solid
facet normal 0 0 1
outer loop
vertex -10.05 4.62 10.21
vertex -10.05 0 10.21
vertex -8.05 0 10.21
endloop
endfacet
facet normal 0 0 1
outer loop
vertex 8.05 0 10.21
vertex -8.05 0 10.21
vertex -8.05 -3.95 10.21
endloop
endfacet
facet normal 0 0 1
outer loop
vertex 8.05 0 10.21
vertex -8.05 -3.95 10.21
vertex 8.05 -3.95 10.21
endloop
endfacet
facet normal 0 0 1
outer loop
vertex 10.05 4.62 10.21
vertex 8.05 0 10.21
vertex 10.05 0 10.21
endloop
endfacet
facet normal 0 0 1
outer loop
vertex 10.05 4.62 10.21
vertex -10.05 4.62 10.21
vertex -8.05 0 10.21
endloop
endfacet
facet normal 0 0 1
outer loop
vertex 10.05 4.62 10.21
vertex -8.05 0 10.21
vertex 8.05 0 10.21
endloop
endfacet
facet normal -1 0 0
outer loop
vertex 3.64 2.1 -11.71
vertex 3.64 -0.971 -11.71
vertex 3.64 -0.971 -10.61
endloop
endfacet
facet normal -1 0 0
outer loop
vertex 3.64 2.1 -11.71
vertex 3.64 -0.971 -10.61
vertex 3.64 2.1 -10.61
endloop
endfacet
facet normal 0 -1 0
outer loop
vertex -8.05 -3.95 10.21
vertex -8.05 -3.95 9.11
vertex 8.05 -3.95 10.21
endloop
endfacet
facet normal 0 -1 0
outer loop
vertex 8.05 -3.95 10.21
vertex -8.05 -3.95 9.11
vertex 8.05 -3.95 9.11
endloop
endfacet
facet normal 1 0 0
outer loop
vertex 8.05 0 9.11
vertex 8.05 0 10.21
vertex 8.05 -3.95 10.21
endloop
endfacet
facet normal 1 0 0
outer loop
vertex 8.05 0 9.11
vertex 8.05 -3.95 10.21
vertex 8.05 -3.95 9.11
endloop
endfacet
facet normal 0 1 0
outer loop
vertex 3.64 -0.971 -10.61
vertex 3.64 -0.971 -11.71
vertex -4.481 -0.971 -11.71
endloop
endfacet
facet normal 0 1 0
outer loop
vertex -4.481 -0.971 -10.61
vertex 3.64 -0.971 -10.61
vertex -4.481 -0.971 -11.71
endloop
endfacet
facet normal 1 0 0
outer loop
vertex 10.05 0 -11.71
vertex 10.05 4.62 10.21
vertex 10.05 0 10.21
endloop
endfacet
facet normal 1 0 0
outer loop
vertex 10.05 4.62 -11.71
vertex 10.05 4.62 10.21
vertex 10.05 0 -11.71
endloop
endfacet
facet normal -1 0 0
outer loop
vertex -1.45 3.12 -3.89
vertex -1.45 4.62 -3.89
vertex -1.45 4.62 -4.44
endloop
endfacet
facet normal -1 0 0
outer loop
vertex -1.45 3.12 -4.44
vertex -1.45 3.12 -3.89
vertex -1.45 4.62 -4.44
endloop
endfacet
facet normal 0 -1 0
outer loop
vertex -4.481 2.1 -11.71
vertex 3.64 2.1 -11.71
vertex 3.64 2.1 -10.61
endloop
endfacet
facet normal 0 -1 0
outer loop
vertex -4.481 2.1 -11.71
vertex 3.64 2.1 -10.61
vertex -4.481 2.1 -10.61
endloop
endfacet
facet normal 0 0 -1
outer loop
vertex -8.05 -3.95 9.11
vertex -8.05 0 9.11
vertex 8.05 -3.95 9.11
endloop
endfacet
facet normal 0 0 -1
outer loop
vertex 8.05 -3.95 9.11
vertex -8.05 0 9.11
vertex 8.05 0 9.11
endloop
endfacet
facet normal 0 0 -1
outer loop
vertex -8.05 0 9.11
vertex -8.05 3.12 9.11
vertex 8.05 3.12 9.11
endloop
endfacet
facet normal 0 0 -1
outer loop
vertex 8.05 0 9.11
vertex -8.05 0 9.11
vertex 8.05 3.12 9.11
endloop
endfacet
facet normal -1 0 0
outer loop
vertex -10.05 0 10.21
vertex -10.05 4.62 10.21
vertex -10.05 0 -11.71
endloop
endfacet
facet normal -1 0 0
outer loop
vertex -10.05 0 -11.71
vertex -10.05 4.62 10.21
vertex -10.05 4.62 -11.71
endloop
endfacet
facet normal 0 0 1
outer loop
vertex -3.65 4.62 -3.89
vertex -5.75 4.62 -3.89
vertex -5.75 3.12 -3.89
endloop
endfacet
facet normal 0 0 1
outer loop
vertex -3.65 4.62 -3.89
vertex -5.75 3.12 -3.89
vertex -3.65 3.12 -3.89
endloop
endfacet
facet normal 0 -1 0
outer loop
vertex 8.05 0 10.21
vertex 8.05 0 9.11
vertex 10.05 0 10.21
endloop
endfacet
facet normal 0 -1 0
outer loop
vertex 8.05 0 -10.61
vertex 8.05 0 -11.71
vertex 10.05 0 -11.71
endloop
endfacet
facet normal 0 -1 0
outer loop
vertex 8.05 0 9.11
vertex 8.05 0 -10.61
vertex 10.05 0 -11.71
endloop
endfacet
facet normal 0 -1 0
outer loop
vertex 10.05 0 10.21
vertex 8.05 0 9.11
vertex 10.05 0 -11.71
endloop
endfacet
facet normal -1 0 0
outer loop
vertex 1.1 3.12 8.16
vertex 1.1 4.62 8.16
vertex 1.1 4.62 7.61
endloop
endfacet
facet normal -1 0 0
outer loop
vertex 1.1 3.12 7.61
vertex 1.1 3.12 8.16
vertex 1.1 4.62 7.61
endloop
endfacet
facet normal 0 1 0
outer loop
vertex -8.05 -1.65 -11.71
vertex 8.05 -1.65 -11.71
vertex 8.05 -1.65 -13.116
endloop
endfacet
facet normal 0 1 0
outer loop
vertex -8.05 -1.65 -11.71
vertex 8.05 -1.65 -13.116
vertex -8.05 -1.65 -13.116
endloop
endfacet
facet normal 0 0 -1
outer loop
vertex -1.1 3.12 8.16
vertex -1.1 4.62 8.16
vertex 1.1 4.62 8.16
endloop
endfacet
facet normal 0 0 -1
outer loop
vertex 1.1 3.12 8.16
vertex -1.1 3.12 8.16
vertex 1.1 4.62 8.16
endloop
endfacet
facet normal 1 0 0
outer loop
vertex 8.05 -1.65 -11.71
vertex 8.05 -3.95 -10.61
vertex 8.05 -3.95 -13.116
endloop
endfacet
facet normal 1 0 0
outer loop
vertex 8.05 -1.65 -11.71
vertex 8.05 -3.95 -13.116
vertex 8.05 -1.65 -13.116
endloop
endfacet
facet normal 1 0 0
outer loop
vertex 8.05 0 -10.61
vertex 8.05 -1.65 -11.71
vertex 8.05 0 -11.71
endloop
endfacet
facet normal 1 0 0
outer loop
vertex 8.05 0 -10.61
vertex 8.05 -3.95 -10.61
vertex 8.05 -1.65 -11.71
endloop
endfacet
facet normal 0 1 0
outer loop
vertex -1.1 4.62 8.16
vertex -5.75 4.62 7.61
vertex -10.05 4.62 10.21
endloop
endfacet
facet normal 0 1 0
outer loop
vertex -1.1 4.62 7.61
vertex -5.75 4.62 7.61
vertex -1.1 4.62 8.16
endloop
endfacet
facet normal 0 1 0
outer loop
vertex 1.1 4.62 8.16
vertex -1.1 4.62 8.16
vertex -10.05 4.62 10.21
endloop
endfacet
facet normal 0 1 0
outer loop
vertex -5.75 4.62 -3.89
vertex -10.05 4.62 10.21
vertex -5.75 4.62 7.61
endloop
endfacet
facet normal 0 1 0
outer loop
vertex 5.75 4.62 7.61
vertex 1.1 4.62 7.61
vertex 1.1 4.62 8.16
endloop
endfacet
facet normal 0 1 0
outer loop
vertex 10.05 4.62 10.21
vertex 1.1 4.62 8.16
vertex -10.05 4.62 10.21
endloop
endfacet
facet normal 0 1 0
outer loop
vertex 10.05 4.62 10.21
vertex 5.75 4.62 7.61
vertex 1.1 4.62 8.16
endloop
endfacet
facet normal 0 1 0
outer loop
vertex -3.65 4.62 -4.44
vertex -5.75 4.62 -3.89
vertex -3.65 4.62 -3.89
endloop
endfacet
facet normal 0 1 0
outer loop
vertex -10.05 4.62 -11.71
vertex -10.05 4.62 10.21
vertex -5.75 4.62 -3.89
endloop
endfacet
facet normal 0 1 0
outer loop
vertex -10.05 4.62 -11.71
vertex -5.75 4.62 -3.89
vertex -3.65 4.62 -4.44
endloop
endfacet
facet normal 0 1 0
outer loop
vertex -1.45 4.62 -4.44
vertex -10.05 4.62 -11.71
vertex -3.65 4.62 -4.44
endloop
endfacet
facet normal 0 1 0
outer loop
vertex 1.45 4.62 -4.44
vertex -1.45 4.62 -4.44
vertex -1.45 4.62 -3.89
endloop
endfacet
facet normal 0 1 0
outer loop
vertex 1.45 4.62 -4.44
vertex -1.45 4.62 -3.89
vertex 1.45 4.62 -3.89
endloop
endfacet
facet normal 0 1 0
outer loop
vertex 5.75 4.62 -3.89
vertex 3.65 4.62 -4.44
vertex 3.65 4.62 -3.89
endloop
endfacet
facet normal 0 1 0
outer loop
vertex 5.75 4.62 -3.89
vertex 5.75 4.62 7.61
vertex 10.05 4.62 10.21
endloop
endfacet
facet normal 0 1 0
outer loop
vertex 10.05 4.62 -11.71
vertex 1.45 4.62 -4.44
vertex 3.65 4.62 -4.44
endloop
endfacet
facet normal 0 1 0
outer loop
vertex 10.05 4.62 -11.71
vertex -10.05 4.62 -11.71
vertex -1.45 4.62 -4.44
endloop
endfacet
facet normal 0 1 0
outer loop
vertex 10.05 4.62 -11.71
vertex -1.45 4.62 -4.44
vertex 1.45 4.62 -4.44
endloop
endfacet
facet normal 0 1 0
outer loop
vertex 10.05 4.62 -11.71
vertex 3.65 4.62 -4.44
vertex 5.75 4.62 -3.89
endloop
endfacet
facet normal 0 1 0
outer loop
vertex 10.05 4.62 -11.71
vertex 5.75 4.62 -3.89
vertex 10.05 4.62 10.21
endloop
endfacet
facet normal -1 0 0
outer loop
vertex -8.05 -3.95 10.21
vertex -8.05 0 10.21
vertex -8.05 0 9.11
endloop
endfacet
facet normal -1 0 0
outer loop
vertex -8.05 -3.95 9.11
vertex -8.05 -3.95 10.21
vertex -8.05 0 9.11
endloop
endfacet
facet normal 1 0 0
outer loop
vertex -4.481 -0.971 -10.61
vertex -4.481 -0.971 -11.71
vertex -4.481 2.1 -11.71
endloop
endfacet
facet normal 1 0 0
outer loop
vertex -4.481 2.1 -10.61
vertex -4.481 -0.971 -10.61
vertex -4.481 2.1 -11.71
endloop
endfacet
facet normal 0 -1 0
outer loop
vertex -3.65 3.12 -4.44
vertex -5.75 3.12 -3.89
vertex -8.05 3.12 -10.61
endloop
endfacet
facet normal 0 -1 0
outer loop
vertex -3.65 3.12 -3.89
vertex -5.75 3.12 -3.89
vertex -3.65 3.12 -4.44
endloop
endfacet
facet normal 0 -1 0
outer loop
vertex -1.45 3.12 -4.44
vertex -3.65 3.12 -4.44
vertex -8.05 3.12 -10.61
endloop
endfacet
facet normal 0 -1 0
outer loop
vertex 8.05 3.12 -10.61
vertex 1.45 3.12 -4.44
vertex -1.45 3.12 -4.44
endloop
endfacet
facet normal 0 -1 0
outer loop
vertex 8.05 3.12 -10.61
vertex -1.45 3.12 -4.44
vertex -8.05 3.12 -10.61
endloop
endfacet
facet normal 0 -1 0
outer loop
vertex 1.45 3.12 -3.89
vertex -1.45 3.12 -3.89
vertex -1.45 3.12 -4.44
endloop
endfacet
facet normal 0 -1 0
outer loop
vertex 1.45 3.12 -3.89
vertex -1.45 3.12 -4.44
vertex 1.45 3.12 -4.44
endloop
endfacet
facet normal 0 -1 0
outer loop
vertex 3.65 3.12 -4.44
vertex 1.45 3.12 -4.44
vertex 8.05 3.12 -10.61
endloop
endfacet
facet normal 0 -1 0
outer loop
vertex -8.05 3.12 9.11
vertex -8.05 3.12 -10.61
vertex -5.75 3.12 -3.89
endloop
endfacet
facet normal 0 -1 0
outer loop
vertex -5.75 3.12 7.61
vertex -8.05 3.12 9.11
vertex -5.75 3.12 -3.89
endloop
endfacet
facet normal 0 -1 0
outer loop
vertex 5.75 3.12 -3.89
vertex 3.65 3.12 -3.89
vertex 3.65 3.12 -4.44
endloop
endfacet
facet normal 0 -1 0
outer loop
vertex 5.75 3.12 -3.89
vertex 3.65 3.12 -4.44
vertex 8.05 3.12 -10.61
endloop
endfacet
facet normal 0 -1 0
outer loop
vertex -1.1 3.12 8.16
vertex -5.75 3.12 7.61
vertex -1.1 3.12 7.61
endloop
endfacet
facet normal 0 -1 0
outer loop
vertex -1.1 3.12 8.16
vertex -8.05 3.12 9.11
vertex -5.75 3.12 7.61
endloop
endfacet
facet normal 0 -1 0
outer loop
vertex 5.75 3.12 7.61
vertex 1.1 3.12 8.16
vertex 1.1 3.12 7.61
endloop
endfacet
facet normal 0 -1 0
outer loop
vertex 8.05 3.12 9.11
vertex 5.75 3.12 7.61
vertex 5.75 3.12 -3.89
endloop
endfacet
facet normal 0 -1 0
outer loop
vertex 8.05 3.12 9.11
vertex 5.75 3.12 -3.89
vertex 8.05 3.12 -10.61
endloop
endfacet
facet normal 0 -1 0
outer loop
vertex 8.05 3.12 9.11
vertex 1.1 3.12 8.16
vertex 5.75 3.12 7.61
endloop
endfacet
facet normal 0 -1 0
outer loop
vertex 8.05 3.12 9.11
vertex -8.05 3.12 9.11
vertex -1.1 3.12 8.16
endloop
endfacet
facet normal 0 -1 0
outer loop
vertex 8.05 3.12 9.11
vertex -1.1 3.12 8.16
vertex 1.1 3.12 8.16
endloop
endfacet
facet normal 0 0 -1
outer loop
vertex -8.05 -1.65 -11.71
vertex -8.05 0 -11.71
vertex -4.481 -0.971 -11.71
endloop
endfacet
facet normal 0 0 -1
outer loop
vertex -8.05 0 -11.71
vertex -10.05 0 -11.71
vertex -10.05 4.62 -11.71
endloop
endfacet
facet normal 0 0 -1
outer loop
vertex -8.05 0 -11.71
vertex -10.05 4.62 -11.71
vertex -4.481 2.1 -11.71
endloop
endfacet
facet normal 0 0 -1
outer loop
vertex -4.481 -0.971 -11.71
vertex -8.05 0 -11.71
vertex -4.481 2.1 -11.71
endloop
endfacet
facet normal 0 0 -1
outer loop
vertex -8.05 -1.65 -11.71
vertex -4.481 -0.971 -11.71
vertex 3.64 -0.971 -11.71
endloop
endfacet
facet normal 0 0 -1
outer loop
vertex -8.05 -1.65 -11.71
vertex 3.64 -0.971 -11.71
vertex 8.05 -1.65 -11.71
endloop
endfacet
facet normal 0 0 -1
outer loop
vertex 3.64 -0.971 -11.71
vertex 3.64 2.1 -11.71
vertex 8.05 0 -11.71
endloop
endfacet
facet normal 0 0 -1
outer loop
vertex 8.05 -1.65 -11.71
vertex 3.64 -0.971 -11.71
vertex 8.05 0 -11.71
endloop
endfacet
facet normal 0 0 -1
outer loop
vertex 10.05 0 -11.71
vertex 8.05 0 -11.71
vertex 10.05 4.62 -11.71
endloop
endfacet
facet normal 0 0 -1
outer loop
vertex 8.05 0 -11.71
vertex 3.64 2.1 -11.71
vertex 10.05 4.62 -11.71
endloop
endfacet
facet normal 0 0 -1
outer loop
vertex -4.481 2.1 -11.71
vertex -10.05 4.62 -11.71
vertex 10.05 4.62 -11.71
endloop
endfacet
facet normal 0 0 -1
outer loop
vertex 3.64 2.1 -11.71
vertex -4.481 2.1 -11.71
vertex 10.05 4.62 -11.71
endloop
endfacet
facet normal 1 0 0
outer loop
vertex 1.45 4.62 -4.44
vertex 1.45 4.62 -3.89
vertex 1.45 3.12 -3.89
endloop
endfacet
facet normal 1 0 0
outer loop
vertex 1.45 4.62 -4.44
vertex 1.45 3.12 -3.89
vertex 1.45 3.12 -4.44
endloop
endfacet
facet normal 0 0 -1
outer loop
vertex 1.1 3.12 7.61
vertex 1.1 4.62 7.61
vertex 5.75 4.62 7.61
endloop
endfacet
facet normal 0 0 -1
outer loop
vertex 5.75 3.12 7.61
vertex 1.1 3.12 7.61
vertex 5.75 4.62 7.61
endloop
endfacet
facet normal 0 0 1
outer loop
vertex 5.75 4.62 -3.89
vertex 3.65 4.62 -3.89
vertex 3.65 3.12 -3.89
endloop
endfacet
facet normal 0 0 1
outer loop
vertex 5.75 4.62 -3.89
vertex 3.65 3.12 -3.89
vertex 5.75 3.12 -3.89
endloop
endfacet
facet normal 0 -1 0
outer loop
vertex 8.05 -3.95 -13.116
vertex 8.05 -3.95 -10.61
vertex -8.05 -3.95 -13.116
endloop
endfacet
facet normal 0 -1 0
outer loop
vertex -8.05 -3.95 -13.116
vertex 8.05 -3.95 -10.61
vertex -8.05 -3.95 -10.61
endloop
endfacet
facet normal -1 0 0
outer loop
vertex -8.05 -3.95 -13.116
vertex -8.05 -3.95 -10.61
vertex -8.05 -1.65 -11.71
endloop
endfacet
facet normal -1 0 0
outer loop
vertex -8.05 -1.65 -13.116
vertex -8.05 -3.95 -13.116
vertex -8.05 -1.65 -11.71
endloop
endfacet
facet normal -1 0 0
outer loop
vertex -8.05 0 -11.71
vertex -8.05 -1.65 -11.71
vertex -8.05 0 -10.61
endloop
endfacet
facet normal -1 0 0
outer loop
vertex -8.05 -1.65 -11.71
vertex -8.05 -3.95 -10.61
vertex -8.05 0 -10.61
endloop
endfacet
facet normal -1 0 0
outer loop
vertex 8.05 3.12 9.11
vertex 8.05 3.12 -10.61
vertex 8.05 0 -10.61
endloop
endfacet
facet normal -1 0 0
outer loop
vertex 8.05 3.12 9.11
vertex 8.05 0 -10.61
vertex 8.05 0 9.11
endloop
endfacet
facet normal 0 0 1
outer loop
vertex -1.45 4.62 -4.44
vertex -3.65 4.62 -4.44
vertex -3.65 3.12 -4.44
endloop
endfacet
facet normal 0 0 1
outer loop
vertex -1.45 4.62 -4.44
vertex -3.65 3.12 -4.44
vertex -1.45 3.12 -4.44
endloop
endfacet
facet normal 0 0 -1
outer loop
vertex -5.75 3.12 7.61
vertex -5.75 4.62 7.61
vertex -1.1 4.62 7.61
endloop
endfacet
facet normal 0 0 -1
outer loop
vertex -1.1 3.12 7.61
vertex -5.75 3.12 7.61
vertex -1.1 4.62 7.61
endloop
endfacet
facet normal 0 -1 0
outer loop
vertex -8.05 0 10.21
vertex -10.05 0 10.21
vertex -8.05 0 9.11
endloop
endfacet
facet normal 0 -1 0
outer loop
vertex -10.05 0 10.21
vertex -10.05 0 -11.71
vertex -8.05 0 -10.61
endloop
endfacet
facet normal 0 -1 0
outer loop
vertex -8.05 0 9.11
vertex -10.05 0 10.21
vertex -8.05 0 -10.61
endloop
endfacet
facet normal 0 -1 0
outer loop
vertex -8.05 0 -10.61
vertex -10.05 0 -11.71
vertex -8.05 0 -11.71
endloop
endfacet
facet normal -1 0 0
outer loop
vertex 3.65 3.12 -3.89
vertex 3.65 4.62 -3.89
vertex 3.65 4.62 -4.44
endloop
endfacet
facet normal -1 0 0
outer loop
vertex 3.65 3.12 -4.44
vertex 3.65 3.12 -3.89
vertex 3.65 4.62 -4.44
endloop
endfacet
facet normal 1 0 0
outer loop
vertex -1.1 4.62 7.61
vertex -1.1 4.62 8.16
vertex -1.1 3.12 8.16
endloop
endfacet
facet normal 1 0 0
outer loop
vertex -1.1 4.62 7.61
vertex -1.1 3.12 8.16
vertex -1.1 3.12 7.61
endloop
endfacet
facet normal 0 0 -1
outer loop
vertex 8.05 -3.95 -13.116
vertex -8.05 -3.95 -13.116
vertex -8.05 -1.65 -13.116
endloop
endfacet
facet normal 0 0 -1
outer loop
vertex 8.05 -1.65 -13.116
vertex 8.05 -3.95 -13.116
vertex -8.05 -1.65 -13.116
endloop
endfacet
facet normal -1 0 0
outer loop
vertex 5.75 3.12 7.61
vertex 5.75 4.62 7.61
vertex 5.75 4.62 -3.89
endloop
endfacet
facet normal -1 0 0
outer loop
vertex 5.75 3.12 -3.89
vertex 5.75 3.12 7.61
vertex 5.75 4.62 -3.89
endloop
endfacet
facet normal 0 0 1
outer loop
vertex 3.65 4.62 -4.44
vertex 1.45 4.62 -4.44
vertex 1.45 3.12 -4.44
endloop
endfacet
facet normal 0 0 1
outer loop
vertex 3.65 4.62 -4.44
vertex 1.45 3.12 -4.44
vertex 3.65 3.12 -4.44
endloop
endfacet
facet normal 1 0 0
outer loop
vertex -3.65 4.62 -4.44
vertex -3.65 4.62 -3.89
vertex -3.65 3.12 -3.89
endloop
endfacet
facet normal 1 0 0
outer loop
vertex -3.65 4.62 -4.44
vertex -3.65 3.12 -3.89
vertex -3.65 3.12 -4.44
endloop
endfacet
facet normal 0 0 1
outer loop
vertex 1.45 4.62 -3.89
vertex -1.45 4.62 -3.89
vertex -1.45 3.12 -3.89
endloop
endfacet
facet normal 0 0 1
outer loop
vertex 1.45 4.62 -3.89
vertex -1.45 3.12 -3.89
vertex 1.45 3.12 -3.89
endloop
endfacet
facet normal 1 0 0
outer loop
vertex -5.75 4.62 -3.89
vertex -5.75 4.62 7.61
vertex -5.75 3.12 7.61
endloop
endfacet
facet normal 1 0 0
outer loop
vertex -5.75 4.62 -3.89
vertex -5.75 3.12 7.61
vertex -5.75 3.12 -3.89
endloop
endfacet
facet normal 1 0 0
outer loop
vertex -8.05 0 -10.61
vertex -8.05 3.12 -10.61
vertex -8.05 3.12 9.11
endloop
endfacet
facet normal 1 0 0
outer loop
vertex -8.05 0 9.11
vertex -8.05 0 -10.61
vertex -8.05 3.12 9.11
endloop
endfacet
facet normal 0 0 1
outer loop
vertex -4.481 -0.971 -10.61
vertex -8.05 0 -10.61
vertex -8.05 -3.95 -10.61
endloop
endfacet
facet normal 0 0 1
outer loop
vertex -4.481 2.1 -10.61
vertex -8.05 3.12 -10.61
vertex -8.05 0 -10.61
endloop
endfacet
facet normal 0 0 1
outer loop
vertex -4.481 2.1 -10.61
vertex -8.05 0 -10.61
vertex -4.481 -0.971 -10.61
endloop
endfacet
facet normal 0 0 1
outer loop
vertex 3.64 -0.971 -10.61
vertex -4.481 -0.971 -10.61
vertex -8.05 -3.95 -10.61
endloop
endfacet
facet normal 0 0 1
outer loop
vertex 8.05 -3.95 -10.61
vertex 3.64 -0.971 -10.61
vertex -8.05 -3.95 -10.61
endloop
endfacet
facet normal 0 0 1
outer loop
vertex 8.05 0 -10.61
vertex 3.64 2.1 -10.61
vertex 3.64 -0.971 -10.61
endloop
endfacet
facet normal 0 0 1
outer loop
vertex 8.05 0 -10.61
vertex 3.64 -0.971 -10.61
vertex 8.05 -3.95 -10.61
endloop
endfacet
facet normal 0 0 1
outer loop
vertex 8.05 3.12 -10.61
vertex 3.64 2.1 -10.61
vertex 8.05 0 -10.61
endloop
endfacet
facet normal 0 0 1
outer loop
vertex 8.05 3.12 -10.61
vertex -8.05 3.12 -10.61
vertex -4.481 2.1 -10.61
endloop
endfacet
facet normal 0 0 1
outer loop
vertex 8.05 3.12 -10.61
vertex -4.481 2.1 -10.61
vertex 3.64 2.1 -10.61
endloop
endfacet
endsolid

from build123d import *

# Parameters (mm, degrees)
SKETCH1_W               = 2
SKETCH1_H               = 20.42
BOSS_EXTRUDE1_DEPTH     = 4.62
BOSS_EXTRUDE1_2_DEPTH   = 4.62
SKETCH2_W               = 16.1
SKETCH2_H               = 1.1
BOSS_EXTRUDE2_DEPTH     = 8.57
SKETCH3_W               = 20.1
SKETCH3_H               = 1.5
BOSS_EXTRUDE3_DEPTH     = 4.62
SKETCH4_W               = 16.1
SKETCH4_H               = 1.5
BOSS_EXTRUDE4_DEPTH     = 3.95
SKETCH5_W               = 19.32
SKETCH5_H               = 1.5
BOSS_EXTRUDE5_DEPTH     = 16.1
SKETCH6_W               = 11.5
SKETCH6_H               = 11.5
CUT_EXTRUDE1_DEPTH      = 18.651388047
SKETCH8_W               = 2.2
SKETCH8_H               = 0.55
CUT_EXTRUDE2_DEPTH      = 3.95
SKETCH10_W              = 8.121119636
SKETCH10_H              = 3.071119636
CUT_EXTRUDE3_DEPTH      = 1.5
SKETCH11_W              = 16.1
SKETCH11_H              = 2.3
BOSS_EXTRUDE6_DEPTH     = 2.08
CUT_EXTRUDE5_START      = -7.07
SKETCH12_W              = 16.1
SKETCH12_H              = 0.4
CUT_EXTRUDE5_DEPTH      = 7.07
CUT_EXTRUDE6_DEPTH      = 24.21892547
CUT_EXTRUDE6_DEPTH_BACK = 24.21892547
SKETCH13_W              = 0.2
SKETCH13_H              = 2.3
SKETCH14_W              = 0.474033505
SKETCH14_H              = 2.3
CUT_EXTRUDE8_DEPTH      = 24.100703452


with BuildPart() as part:
    # Sketch1 → Boss-Extrude1 (new body)
    with BuildSketch(Plane(origin=(0, 0, 0), x_dir=(1, 0, 0), z_dir=(0, 1, 0))):
        with Locations((-9.05, 0)):
            Rectangle(SKETCH1_W, SKETCH1_H)
    extrude(amount=BOSS_EXTRUDE1_DEPTH)



with BuildPart() as body_2:
    # Sketch1 → Boss-Extrude1 2 (new body)
    with BuildSketch(Plane(origin=(0, 0, 0), x_dir=(1, 0, 0), z_dir=(0, 1, 0))):
        with Locations((9.05, 0)):
            Rectangle(SKETCH1_W, SKETCH1_H)
    extrude(amount=BOSS_EXTRUDE1_2_DEPTH)


with BuildPart() as part_1:
    add(part.part)

    add(body_2.part)  # Boss-Extrude2 merges body 2
    # Sketch2 → Boss-Extrude2 (add)
    with BuildSketch(Plane(origin=(0, 4.62, 0), x_dir=(1, 0, 0), z_dir=(0, 1, 0))):
        with Locations((0, -9.66)):
            Rectangle(SKETCH2_W, SKETCH2_H)
    extrude(amount=-BOSS_EXTRUDE2_DEPTH)

    # Sketch3 → Boss-Extrude3 (add)
    with BuildSketch(Plane(origin=(0, 4.62, 0), x_dir=(1, 0, 0), z_dir=(0, 1, 0))):
        with Locations((0, 10.96)):
            Rectangle(SKETCH3_W, SKETCH3_H)
    extrude(amount=-BOSS_EXTRUDE3_DEPTH)

    # Sketch4 → Boss-Extrude4 (add)
    with BuildSketch(Plane.XZ):
        with Locations((0, -10.96)):
            Rectangle(SKETCH4_W, SKETCH4_H)
    extrude(amount=BOSS_EXTRUDE4_DEPTH)

    # Sketch5 → Boss-Extrude5 (add)
    with BuildSketch(Plane(origin=(-8.05, 0, 0), x_dir=(0, 0, -1), z_dir=(1, 0, 0))):
        with Locations((0.55, 3.87)):
            Rectangle(SKETCH5_W, SKETCH5_H)
    extrude(amount=BOSS_EXTRUDE5_DEPTH)

    # Sketch6 → Cut-Extrude1 (cut, through all)
    with BuildSketch(Plane(origin=(0, 4.62, 0), x_dir=(1, 0, 0), z_dir=(0, 1, 0))):
        with Locations((0, -1.86)):
            Rectangle(SKETCH6_W, SKETCH6_H)
    extrude(amount=-CUT_EXTRUDE1_DEPTH, mode=Mode.SUBTRACT)

    # Sketch8 → Cut-Extrude2 (cut)
    with BuildSketch(Plane(origin=(0, 4.62, 0), x_dir=(1, 0, 0), z_dir=(0, 1, 0))):
        with Locations((0, -7.885)):
            Rectangle(SKETCH8_W, SKETCH8_H)
        with Locations((-2.55, 4.165)):
            Rectangle(SKETCH8_W, SKETCH8_H)
        with Locations((2.55, 4.165)):
            Rectangle(SKETCH8_W, SKETCH8_H)
    extrude(amount=-CUT_EXTRUDE2_DEPTH, mode=Mode.SUBTRACT)

    # Sketch10 → Cut-Extrude3 (cut)
    with BuildSketch(Plane(origin=(0, 0, -11.71), x_dir=(-1, 0, 0), z_dir=(0, 0, -1))):
        with Locations((0.420559818, 0.564440182)):
            Rectangle(SKETCH10_W, SKETCH10_H)
    extrude(amount=-CUT_EXTRUDE3_DEPTH, mode=Mode.SUBTRACT)

    # Sketch11 → Boss-Extrude6 (add)
    with BuildSketch(Plane(origin=(0, 0, -11.71), x_dir=(-1, 0, 0), z_dir=(0, 0, -1))):
        with Locations((0, -2.8)):
            Rectangle(SKETCH11_W, SKETCH11_H)
    extrude(amount=BOSS_EXTRUDE6_DEPTH)

    # Sketch12 → Cut-Extrude5 (cut)
    with BuildSketch(Plane.XZ.offset(3.95).offset(CUT_EXTRUDE5_START)):
        with Locations((0, -10.41)):
            Rectangle(SKETCH12_W, SKETCH12_H)
    extrude(amount=CUT_EXTRUDE5_DEPTH, mode=Mode.SUBTRACT)

    # Sketch13 → Cut-Extrude6 (cut, two sides: drawn at the far end of the back side and taken through both)
    with BuildSketch(Plane.ZY.offset(8.05).offset(-CUT_EXTRUDE6_DEPTH_BACK)):
        with Locations((-13.69, -2.8)):
            Rectangle(SKETCH13_W, SKETCH13_H)
    extrude(amount=CUT_EXTRUDE6_DEPTH + CUT_EXTRUDE6_DEPTH_BACK, mode=Mode.SUBTRACT)

    # Sketch14 → Cut-Extrude8 (cut, through all)
    with BuildSketch(Plane.ZY.offset(8.05)):
        with Locations((-13.352983248, -2.8)):
            Rectangle(SKETCH14_W, SKETCH14_H)
    extrude(amount=-CUT_EXTRUDE8_DEPTH, mode=Mode.SUBTRACT)


solid = part_1.part
